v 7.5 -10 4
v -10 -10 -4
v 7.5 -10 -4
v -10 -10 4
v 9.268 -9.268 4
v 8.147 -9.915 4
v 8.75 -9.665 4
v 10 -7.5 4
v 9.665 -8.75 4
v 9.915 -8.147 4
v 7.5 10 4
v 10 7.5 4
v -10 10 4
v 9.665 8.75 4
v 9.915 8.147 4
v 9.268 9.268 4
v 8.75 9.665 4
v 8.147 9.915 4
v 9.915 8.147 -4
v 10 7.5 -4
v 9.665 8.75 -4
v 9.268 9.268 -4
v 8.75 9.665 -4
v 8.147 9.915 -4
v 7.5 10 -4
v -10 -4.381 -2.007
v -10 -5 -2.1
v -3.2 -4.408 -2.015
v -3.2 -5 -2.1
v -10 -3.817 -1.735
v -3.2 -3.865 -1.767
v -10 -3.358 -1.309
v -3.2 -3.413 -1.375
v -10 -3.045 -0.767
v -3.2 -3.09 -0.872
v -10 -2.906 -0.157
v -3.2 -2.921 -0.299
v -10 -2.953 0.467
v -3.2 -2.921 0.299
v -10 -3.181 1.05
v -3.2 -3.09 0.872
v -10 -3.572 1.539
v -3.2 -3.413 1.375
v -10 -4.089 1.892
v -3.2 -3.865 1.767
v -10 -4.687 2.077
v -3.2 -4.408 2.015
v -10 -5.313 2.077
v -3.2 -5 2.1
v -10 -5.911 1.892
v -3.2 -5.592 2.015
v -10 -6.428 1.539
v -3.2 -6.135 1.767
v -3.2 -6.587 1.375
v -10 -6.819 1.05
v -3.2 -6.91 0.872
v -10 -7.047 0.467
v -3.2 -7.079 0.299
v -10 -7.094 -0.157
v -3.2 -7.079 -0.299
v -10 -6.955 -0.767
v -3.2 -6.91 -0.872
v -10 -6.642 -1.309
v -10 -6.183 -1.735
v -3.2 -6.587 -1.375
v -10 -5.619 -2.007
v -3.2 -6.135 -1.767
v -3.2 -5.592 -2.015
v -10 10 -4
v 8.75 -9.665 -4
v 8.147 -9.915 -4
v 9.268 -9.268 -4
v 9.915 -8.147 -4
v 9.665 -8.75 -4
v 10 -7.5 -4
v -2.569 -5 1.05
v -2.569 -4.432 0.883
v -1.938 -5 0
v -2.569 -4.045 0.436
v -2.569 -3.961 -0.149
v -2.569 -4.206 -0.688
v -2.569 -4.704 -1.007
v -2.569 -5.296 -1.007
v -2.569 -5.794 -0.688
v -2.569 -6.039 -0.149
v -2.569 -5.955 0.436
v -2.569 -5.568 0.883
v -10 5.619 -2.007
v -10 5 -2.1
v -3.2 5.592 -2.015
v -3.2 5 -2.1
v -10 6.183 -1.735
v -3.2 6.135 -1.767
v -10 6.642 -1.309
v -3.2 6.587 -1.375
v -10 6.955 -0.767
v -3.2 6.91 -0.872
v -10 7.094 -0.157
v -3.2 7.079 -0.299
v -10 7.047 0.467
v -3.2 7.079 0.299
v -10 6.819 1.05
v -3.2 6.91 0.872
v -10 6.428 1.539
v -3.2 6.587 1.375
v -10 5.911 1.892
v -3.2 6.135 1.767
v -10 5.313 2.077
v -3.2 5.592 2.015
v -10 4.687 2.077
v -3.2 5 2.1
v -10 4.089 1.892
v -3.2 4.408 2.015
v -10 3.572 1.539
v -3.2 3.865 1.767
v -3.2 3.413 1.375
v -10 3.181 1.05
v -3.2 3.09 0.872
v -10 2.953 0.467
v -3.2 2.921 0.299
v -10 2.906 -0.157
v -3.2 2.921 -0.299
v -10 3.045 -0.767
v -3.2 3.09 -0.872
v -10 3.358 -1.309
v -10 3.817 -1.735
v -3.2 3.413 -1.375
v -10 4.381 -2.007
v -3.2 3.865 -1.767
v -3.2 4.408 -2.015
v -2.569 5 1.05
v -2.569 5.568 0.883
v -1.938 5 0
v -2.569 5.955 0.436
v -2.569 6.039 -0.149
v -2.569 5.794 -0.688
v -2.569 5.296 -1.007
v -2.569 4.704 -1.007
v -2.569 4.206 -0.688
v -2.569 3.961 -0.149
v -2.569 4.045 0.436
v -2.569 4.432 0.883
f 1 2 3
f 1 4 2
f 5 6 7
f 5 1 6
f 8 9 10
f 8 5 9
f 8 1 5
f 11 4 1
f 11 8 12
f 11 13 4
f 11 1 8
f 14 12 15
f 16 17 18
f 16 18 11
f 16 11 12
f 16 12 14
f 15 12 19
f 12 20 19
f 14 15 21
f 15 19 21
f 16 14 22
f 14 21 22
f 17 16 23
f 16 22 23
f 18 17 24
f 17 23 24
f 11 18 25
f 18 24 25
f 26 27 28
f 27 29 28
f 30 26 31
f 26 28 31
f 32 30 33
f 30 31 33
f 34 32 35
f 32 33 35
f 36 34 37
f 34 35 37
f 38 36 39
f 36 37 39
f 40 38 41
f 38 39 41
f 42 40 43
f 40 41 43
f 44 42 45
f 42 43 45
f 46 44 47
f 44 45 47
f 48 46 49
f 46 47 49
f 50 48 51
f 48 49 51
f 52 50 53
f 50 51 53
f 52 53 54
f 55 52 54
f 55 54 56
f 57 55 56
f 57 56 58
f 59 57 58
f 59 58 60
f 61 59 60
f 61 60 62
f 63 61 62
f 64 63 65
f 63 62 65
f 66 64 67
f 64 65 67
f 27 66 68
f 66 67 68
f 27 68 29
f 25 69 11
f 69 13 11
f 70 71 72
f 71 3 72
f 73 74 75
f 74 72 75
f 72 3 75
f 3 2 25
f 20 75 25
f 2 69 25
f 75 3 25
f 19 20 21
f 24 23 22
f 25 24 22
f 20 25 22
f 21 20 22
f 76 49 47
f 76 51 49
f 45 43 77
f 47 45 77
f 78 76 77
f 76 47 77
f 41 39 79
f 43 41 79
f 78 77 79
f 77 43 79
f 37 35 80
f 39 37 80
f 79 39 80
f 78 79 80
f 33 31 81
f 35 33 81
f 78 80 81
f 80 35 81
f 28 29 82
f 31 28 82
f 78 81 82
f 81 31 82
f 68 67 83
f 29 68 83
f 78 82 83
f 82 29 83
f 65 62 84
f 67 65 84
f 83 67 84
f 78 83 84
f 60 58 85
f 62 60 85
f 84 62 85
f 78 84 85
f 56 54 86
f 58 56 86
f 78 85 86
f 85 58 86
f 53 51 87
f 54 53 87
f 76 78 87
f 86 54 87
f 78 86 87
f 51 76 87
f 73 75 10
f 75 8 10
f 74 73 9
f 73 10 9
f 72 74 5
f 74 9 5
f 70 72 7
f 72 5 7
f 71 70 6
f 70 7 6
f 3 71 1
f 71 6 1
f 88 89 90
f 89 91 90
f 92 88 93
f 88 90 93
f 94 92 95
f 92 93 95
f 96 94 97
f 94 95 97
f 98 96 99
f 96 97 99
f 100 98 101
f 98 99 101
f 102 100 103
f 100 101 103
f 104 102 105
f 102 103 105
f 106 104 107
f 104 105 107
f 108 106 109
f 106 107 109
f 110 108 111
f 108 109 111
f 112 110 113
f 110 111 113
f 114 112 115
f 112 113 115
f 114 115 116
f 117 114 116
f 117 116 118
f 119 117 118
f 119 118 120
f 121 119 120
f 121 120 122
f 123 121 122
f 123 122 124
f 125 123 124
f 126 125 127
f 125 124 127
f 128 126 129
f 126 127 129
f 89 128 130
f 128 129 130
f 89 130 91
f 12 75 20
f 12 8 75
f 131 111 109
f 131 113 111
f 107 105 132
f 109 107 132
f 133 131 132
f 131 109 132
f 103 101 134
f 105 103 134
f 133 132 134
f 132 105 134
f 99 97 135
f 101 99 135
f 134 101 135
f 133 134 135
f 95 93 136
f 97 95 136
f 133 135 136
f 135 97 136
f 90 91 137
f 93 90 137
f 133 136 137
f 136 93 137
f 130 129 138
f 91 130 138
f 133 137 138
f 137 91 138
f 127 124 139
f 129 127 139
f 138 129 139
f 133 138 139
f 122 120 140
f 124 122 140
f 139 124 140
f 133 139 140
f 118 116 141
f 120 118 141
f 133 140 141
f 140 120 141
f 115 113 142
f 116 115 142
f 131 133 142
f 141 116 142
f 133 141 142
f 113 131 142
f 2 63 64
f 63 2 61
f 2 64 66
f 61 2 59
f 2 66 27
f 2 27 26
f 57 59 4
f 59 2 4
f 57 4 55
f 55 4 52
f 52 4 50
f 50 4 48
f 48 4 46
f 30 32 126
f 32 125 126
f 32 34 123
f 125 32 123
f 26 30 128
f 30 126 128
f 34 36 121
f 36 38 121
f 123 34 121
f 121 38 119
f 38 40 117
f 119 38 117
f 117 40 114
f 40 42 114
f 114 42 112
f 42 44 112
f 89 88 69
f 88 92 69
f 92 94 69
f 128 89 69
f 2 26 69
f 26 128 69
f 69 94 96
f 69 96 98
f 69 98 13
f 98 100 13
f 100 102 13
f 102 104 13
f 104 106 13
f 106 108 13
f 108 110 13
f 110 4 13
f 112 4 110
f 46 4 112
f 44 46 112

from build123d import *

# Parameters (mm, degrees)
SKETCH2_W                              = 20
SKETCH2_H                              = 20
BOSS_EXTRUDE1_DEPTH                    = 4
FILLET1_R                              = 2.5
TAPPED_HOLE_FOR_M4X0_7_HELICOIL1_D     = 4.2
TAPPED_HOLE_FOR_M4X0_7_HELICOIL1_DEPTH = 6.8
TAPPED_HOLE_FOR_M4X0_7_HELICOIL1_TIP   = 1.2618073


with BuildPart() as part:
    # Sketch2 → Boss-Extrude1 (new, symmetric)
    with BuildSketch(Plane.XY):
        Rectangle(SKETCH2_W, SKETCH2_H)
    extrude(amount=BOSS_EXTRUDE1_DEPTH, both=True)

    # Fillet1
    fillet1_edges = [part.edges().sort_by_distance(p)[0] for p in [
        (10, 10, 0),
        (10, -10, 0),
    ]]
    fillet(fillet1_edges, radius=FILLET1_R)

    # Tapped Hole for M4x0.7 Helicoil1
    with Locations(Plane.ZY.offset(10)):
        with Locations((0, 5), (0, -5)):
            Hole(TAPPED_HOLE_FOR_M4X0_7_HELICOIL1_D / 2, depth=TAPPED_HOLE_FOR_M4X0_7_HELICOIL1_DEPTH)
            with Locations((0, 0, -(TAPPED_HOLE_FOR_M4X0_7_HELICOIL1_DEPTH + TAPPED_HOLE_FOR_M4X0_7_HELICOIL1_TIP / 2))):  # 118° drill point
                Cone(0, TAPPED_HOLE_FOR_M4X0_7_HELICOIL1_D / 2, TAPPED_HOLE_FOR_M4X0_7_HELICOIL1_TIP, mode=Mode.SUBTRACT)


solid = part.part
